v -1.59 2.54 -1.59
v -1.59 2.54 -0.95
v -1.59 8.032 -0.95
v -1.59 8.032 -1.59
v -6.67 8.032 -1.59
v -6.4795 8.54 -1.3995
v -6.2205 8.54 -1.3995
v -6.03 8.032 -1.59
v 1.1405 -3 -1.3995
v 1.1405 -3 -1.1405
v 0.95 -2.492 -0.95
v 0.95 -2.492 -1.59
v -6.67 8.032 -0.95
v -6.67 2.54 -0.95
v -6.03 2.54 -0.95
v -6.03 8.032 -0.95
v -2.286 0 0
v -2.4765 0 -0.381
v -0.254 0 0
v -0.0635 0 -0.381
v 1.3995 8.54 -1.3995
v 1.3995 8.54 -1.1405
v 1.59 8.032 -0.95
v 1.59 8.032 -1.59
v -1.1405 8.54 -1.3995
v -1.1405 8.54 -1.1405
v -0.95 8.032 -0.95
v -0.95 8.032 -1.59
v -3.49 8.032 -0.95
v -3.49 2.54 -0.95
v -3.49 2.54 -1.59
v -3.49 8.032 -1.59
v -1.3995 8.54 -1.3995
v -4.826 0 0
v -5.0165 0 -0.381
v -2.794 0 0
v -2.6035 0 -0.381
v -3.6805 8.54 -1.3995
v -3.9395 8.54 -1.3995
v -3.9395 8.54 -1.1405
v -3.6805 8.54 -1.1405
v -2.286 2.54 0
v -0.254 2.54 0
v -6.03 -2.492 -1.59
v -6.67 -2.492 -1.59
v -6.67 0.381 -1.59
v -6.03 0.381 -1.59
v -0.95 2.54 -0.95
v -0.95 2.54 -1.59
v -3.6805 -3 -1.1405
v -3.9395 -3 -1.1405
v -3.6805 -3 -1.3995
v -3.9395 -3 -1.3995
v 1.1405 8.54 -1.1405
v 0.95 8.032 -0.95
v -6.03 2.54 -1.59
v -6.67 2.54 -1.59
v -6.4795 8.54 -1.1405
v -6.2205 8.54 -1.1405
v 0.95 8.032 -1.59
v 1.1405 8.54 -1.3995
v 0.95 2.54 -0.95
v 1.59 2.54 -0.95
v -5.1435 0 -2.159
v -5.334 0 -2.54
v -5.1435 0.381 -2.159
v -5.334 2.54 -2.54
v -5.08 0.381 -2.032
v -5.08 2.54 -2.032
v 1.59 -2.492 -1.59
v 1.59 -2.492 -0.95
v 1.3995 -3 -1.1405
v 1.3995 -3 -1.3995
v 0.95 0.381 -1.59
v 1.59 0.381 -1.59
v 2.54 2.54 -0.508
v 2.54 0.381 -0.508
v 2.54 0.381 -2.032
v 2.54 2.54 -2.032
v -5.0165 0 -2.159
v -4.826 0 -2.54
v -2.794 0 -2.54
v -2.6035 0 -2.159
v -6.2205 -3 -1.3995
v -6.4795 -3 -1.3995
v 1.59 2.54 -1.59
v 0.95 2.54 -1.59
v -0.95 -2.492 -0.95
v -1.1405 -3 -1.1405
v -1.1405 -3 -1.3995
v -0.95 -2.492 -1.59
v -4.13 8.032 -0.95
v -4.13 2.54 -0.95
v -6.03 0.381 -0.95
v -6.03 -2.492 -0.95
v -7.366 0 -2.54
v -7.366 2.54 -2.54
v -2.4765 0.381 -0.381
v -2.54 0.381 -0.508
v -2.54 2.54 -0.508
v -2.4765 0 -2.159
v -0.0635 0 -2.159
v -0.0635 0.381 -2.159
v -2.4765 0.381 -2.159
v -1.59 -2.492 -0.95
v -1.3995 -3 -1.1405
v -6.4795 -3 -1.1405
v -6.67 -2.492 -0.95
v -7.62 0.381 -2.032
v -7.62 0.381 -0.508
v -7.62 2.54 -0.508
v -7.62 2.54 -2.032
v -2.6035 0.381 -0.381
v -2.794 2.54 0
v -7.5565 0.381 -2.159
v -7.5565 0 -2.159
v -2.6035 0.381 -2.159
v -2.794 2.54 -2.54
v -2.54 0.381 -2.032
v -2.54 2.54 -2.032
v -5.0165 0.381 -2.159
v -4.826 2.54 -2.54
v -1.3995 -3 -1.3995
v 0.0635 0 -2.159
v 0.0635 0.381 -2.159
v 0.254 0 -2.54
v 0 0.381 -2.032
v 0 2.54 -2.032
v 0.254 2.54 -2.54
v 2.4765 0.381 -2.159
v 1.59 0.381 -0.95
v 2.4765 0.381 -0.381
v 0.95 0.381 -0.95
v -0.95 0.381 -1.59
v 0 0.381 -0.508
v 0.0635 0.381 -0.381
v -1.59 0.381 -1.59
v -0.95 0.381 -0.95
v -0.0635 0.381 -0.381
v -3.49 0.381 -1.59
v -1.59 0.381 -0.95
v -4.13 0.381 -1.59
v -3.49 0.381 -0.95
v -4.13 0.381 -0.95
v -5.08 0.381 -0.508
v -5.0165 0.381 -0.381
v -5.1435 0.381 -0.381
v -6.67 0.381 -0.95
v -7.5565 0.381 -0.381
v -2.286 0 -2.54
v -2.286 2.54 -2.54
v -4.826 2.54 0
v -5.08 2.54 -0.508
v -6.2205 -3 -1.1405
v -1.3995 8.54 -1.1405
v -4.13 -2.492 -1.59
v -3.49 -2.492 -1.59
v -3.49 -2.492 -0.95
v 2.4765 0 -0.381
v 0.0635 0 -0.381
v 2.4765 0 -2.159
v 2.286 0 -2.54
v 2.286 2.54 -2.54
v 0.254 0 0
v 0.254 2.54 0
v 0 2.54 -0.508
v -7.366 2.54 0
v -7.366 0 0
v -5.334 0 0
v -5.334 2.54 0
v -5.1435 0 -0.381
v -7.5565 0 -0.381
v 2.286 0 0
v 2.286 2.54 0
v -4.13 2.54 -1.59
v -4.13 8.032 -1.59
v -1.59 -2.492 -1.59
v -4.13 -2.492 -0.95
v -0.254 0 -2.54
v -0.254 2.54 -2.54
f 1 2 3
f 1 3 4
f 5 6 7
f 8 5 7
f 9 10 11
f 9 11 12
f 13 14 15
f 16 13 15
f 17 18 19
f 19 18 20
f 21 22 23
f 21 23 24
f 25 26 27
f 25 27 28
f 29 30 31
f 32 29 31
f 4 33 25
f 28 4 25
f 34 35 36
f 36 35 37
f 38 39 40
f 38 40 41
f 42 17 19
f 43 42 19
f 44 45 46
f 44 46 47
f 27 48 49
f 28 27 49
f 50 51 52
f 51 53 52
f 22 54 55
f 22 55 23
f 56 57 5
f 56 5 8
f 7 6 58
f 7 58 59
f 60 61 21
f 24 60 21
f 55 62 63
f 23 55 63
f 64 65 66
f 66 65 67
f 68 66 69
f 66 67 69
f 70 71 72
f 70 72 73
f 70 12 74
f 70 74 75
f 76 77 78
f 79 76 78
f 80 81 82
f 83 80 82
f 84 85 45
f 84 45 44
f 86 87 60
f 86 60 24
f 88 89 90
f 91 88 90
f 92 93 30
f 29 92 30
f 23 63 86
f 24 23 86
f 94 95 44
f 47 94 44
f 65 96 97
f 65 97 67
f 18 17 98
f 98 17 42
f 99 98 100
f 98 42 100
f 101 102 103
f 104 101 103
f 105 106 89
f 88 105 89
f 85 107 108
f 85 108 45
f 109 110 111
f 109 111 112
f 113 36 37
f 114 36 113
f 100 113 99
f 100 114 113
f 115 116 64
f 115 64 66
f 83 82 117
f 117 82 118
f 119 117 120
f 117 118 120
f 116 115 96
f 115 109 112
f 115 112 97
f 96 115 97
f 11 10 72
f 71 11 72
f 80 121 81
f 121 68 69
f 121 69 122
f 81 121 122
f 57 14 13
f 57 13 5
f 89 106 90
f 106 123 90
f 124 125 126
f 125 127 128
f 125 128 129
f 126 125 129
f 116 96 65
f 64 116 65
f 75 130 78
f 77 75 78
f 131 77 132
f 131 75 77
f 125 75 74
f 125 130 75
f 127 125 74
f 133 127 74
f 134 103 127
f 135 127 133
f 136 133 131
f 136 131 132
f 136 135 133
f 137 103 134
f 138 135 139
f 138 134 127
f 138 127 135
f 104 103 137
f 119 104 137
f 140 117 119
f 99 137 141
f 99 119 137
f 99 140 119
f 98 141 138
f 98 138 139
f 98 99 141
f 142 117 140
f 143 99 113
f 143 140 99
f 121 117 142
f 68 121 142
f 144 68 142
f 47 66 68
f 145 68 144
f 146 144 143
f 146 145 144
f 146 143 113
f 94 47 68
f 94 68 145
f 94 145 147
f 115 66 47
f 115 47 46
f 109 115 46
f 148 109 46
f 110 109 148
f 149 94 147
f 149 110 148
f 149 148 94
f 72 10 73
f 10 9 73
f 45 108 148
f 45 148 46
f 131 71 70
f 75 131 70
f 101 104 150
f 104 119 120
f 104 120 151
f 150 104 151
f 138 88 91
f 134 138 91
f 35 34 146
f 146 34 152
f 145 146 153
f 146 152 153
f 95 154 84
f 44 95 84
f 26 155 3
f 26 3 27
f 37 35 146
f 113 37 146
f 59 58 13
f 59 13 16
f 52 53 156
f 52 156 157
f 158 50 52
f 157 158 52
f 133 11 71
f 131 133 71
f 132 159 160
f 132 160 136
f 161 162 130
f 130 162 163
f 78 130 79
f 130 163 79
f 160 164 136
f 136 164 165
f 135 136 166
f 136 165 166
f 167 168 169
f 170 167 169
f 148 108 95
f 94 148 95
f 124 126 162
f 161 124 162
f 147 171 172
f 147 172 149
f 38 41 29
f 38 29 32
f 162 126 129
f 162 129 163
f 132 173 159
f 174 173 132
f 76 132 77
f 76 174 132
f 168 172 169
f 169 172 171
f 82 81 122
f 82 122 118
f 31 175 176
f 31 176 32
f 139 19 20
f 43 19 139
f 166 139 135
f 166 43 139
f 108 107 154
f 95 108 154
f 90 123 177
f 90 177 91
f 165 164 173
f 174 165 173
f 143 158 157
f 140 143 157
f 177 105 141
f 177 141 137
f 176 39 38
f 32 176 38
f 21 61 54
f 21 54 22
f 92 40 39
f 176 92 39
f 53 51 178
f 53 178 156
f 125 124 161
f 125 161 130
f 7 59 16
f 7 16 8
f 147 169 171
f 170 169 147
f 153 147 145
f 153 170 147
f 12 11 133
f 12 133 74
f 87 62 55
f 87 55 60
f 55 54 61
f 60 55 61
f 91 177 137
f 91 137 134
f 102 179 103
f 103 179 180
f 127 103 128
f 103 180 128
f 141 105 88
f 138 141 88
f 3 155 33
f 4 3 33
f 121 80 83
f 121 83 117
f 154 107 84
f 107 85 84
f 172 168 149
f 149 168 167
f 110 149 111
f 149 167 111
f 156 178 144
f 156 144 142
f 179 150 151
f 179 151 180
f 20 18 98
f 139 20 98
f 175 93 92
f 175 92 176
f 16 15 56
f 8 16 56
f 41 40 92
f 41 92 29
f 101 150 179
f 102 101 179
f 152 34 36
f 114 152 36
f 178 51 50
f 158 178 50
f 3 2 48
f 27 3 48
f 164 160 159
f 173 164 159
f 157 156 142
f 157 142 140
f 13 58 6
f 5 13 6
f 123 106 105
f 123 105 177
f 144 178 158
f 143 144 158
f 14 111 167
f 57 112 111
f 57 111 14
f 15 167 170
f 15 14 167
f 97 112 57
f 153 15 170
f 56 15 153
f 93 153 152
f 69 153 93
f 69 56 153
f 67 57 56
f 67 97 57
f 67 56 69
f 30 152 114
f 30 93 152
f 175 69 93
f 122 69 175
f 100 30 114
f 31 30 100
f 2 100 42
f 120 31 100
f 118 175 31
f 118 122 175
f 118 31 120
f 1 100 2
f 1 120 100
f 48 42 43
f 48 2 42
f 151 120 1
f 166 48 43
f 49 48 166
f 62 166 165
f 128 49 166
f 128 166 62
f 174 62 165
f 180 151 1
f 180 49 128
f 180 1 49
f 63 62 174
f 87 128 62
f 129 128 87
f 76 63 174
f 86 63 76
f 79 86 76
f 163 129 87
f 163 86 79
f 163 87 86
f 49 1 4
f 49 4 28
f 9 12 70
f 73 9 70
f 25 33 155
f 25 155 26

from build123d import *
from OCP.BRepFilletAPI import BRepFilletAPI_MakeChamfer

# Parameters (mm, degrees)
SKETCH1_W                     = 2.54
SKETCH1_H                     = 2.54
MAIN_BODY_DEPTH               = 2.54
SKETCH3_W                     = 1.778
SKETCH3_H                     = 0.381
CUT_EXTRUDE1_DEPTH            = 5.399409051
CUT_EXTRUDE2_DEPTH            = 5.399409051
BODY_PATTERN_COUNT            = 4
BODY_PATTERN_PITCH            = 2.54
PIN_START                     = -5.54
SKETCH2_W                     = 0.64
SKETCH2_H                     = 0.64
PIN_DEPTH                     = 11.54
CHAMFER1_SIZE                 = 0.508
CHAMFER1_SIZE2                = 0.1905
CHAMFER2_SIZE                 = 0.1905
CHAMFER2_SIZE2                = 0.508
PIN_PATTERN_COUNT             = 4
PIN_PATTERN_PITCH             = 2.54
CHAMFER1_OF_PIN_PATTERN_SIZE  = 0.508
CHAMFER1_OF_PIN_PATTERN_SIZE2 = 0.1905
CHAMFER2_OF_PIN_PATTERN_SIZE2 = 0.1905
CHAMFER2_OF_PIN_PATTERN_SIZE  = 0.508


with BuildPart() as part:
    # Sketch1 → Main Body (new body)
    with BuildSketch(Plane(origin=(0, 0, 0), x_dir=(1, 0, 0), z_dir=(0, 1, 0))):
        with Locations((1.27, 1.27)):
            Rectangle(SKETCH1_W, SKETCH1_H)
    main_body = extrude(amount=MAIN_BODY_DEPTH)

    # Sketch3 → Cut-Extrude1 (cut, through all)
    with BuildSketch(Plane.ZY):
        with Locations((-1.27, 0.1905)):
            Rectangle(SKETCH3_W, SKETCH3_H)
    cut_extrude1 = extrude(amount=-CUT_EXTRUDE1_DEPTH, mode=Mode.SUBTRACT)

    # Sketch4 → Cut-Extrude2 (cut, through all)
    with BuildSketch(Plane(origin=(0, 2.54, 0), x_dir=(1, 0, 0), z_dir=(0, 1, 0))):
        Polygon((0.254, 2.54), (0, 2.54), (0, 2.032), align=None)
        Polygon((2.54, 2.54), (2.286, 2.54), (2.54, 2.032), align=None)
        Polygon((0.254, 0), (0, 0.508), (0, 0), align=None)
        Polygon((2.54, 0), (2.286, 0), (2.54, 0.508), align=None)
    cut_extrude2 = extrude(amount=-CUT_EXTRUDE2_DEPTH, mode=Mode.SUBTRACT)

    # Body Pattern: Main Body, Cut-Extrude1, Cut-Extrude2 ×4
    with Locations(*[(-i * BODY_PATTERN_PITCH, 0, 0) for i in range(1, BODY_PATTERN_COUNT)]):
        add(main_body)
        add(cut_extrude1, mode=Mode.SUBTRACT)
        add(cut_extrude2, mode=Mode.SUBTRACT)

    # Sketch2 → Pin (add)
    with BuildSketch(Plane(origin=(0, 2.54, 0), x_dir=(1, 0, 0), z_dir=(0, 1, 0)).offset(PIN_START)):
        with Locations((1.27, 1.27)):
            Rectangle(SKETCH2_W, SKETCH2_H)
    pin = extrude(amount=PIN_DEPTH)

    # Chamfer1: one chamfer whose edges measure the first distance from different faces: ONE call of the kernel's chamfer builder (chamfer() names one face for all edges)
    chamfer1_edges_1 = [part.edges().sort_by_distance(p)[0] for p in [
        (0.95, 8.54, -1.27),
    ]]
    chamfer1_side_1 = [part.faces().sort_by_distance(p)[0] for p in [
        (0.95, 5.54, -1.27),
    ]]
    chamfer1_edges_2 = [part.edges().sort_by_distance(p)[0] for p in [
        (1.27, 8.54, -0.95),
    ]]
    chamfer1_side_2 = [part.faces().sort_by_distance(p)[0] for p in [
        (1.27, 5.54, -0.95),
    ]]
    chamfer1_edges_3 = [part.edges().sort_by_distance(p)[0] for p in [
        (1.59, 8.54, -1.27),
    ]]
    chamfer1_side_3 = [part.faces().sort_by_distance(p)[0] for p in [
        (1.59, 5.54, -1.27),
    ]]
    chamfer1_edges_4 = [part.edges().sort_by_distance(p)[0] for p in [
        (1.27, 8.54, -1.59),
    ]]
    chamfer1_side_4 = [part.faces().sort_by_distance(p)[0] for p in [
        (1.27, 5.54, -1.59),
    ]]
    chamfer1 = BRepFilletAPI_MakeChamfer(part.part.solid().wrapped)
    for e in chamfer1_edges_1:
        chamfer1.Add(CHAMFER1_SIZE, CHAMFER1_SIZE2, e.wrapped, chamfer1_side_1[0].wrapped)  # the first distance lies on this face
    for e in chamfer1_edges_2:
        chamfer1.Add(CHAMFER1_SIZE, CHAMFER1_SIZE2, e.wrapped, chamfer1_side_2[0].wrapped)  # the first distance lies on this face
    for e in chamfer1_edges_3:
        chamfer1.Add(CHAMFER1_SIZE, CHAMFER1_SIZE2, e.wrapped, chamfer1_side_3[0].wrapped)  # the first distance lies on this face
    for e in chamfer1_edges_4:
        chamfer1.Add(CHAMFER1_SIZE, CHAMFER1_SIZE2, e.wrapped, chamfer1_side_4[0].wrapped)  # the first distance lies on this face
    add(Compound.cast(chamfer1.Shape()), mode=Mode.REPLACE)

    # Chamfer2
    chamfer2_edges = [part.edges().sort_by_distance(p)[0] for p in [
        (1.27, -3, -0.95),
        (1.59, -3, -1.27),
        (1.27, -3, -1.59),
        (0.95, -3, -1.27),
    ]]
    chamfer2_side = [part.faces().sort_by_distance(p)[0] for p in [
        (1.27, -3, -1.27),
    ]]
    chamfer(chamfer2_edges, length=CHAMFER2_SIZE, length2=CHAMFER2_SIZE2, reference=chamfer2_side[0])

    # Pin Pattern: Pin ×4
    with Locations(*[(-i * PIN_PATTERN_PITCH, 0, 0) for i in range(1, PIN_PATTERN_COUNT)]):
        add(pin)

    # Chamfer1 of Pin Pattern: one chamfer whose edges measure the first distance from different faces: ONE call of the kernel's chamfer builder (chamfer() names one face for all edges)
    chamfer1_of_pin_pattern_edges_1 = [part.edges().sort_by_distance(p)[0] for p in [
        (-1.59, 8.54, -1.27),
    ]]
    chamfer1_of_pin_pattern_side_1 = [part.faces().sort_by_distance(p)[0] for p in [
        (-1.59, 5.54, -1.27),
    ]]
    chamfer1_of_pin_pattern_edges_2 = [part.edges().sort_by_distance(p)[0] for p in [
        (-1.27, 8.54, -0.95),
    ]]
    chamfer1_of_pin_pattern_side_2 = [part.faces().sort_by_distance(p)[0] for p in [
        (-1.27, 5.54, -0.95),
    ]]
    chamfer1_of_pin_pattern_edges_3 = [part.edges().sort_by_distance(p)[0] for p in [
        (-0.95, 8.54, -1.27),
    ]]
    chamfer1_of_pin_pattern_side_3 = [part.faces().sort_by_distance(p)[0] for p in [
        (-0.95, 5.54, -1.27),
    ]]
    chamfer1_of_pin_pattern_edges_4 = [part.edges().sort_by_distance(p)[0] for p in [
        (-1.27, 8.54, -1.59),
    ]]
    chamfer1_of_pin_pattern_side_4 = [part.faces().sort_by_distance(p)[0] for p in [
        (-1.27, 5.54, -1.59),
    ]]
    chamfer1_of_pin_pattern_edges_5 = [part.edges().sort_by_distance(p)[0] for p in [
        (-4.13, 8.54, -1.27),
    ]]
    chamfer1_of_pin_pattern_side_5 = [part.faces().sort_by_distance(p)[0] for p in [
        (-4.13, 5.54, -1.27),
    ]]
    chamfer1_of_pin_pattern_edges_6 = [part.edges().sort_by_distance(p)[0] for p in [
        (-3.81, 8.54, -0.95),
    ]]
    chamfer1_of_pin_pattern_side_6 = [part.faces().sort_by_distance(p)[0] for p in [
        (-3.81, 5.54, -0.95),
    ]]
    chamfer1_of_pin_pattern_edges_7 = [part.edges().sort_by_distance(p)[0] for p in [
        (-3.49, 8.54, -1.27),
    ]]
    chamfer1_of_pin_pattern_side_7 = [part.faces().sort_by_distance(p)[0] for p in [
        (-3.49, 5.54, -1.27),
    ]]
    chamfer1_of_pin_pattern_edges_8 = [part.edges().sort_by_distance(p)[0] for p in [
        (-3.81, 8.54, -1.59),
    ]]
    chamfer1_of_pin_pattern_side_8 = [part.faces().sort_by_distance(p)[0] for p in [
        (-3.81, 5.54, -1.59),
    ]]
    chamfer1_of_pin_pattern_edges_9 = [part.edges().sort_by_distance(p)[0] for p in [
        (-6.67, 8.54, -1.27),
    ]]
    chamfer1_of_pin_pattern_side_9 = [part.faces().sort_by_distance(p)[0] for p in [
        (-6.67, 5.54, -1.27),
    ]]
    chamfer1_of_pin_pattern_edges_10 = [part.edges().sort_by_distance(p)[0] for p in [
        (-6.35, 8.54, -0.95),
    ]]
    chamfer1_of_pin_pattern_side_10 = [part.faces().sort_by_distance(p)[0] for p in [
        (-6.35, 5.54, -0.95),
    ]]
    chamfer1_of_pin_pattern_edges_11 = [part.edges().sort_by_distance(p)[0] for p in [
        (-6.03, 8.54, -1.27),
    ]]
    chamfer1_of_pin_pattern_side_11 = [part.faces().sort_by_distance(p)[0] for p in [
        (-6.03, 5.54, -1.27),
    ]]
    chamfer1_of_pin_pattern_edges_12 = [part.edges().sort_by_distance(p)[0] for p in [
        (-6.35, 8.54, -1.59),
    ]]
    chamfer1_of_pin_pattern_side_12 = [part.faces().sort_by_distance(p)[0] for p in [
        (-6.35, 5.54, -1.59),
    ]]
    chamfer1_of_pin_pattern = BRepFilletAPI_MakeChamfer(part.part.solid().wrapped)
    for e in chamfer1_of_pin_pattern_edges_1:
        chamfer1_of_pin_pattern.Add(CHAMFER1_OF_PIN_PATTERN_SIZE, CHAMFER1_OF_PIN_PATTERN_SIZE2, e.wrapped, chamfer1_of_pin_pattern_side_1[0].wrapped)  # the first distance lies on this face
    for e in chamfer1_of_pin_pattern_edges_2:
        chamfer1_of_pin_pattern.Add(CHAMFER1_OF_PIN_PATTERN_SIZE, CHAMFER1_OF_PIN_PATTERN_SIZE2, e.wrapped, chamfer1_of_pin_pattern_side_2[0].wrapped)  # the first distance lies on this face
    for e in chamfer1_of_pin_pattern_edges_3:
        chamfer1_of_pin_pattern.Add(CHAMFER1_OF_PIN_PATTERN_SIZE, CHAMFER1_OF_PIN_PATTERN_SIZE2, e.wrapped, chamfer1_of_pin_pattern_side_3[0].wrapped)  # the first distance lies on this face
    for e in chamfer1_of_pin_pattern_edges_4:
        chamfer1_of_pin_pattern.Add(CHAMFER1_OF_PIN_PATTERN_SIZE, CHAMFER1_OF_PIN_PATTERN_SIZE2, e.wrapped, chamfer1_of_pin_pattern_side_4[0].wrapped)  # the first distance lies on this face
    for e in chamfer1_of_pin_pattern_edges_5:
        chamfer1_of_pin_pattern.Add(CHAMFER1_OF_PIN_PATTERN_SIZE, CHAMFER1_OF_PIN_PATTERN_SIZE2, e.wrapped, chamfer1_of_pin_pattern_side_5[0].wrapped)  # the first distance lies on this face
    for e in chamfer1_of_pin_pattern_edges_6:
        chamfer1_of_pin_pattern.Add(CHAMFER1_OF_PIN_PATTERN_SIZE, CHAMFER1_OF_PIN_PATTERN_SIZE2, e.wrapped, chamfer1_of_pin_pattern_side_6[0].wrapped)  # the first distance lies on this face
    for e in chamfer1_of_pin_pattern_edges_7:
        chamfer1_of_pin_pattern.Add(CHAMFER1_OF_PIN_PATTERN_SIZE, CHAMFER1_OF_PIN_PATTERN_SIZE2, e.wrapped, chamfer1_of_pin_pattern_side_7[0].wrapped)  # the first distance lies on this face
    for e in chamfer1_of_pin_pattern_edges_8:
        chamfer1_of_pin_pattern.Add(CHAMFER1_OF_PIN_PATTERN_SIZE, CHAMFER1_OF_PIN_PATTERN_SIZE2, e.wrapped, chamfer1_of_pin_pattern_side_8[0].wrapped)  # the first distance lies on this face
    for e in chamfer1_of_pin_pattern_edges_9:
        chamfer1_of_pin_pattern.Add(CHAMFER1_OF_PIN_PATTERN_SIZE, CHAMFER1_OF_PIN_PATTERN_SIZE2, e.wrapped, chamfer1_of_pin_pattern_side_9[0].wrapped)  # the first distance lies on this face
    for e in chamfer1_of_pin_pattern_edges_10:
        chamfer1_of_pin_pattern.Add(CHAMFER1_OF_PIN_PATTERN_SIZE, CHAMFER1_OF_PIN_PATTERN_SIZE2, e.wrapped, chamfer1_of_pin_pattern_side_10[0].wrapped)  # the first distance lies on this face
    for e in chamfer1_of_pin_pattern_edges_11:
        chamfer1_of_pin_pattern.Add(CHAMFER1_OF_PIN_PATTERN_SIZE, CHAMFER1_OF_PIN_PATTERN_SIZE2, e.wrapped, chamfer1_of_pin_pattern_side_11[0].wrapped)  # the first distance lies on this face
    for e in chamfer1_of_pin_pattern_edges_12:
        chamfer1_of_pin_pattern.Add(CHAMFER1_OF_PIN_PATTERN_SIZE, CHAMFER1_OF_PIN_PATTERN_SIZE2, e.wrapped, chamfer1_of_pin_pattern_side_12[0].wrapped)  # the first distance lies on this face
    add(Compound.cast(chamfer1_of_pin_pattern.Shape()), mode=Mode.REPLACE)

    # Chamfer2 of Pin Pattern
    chamfer2_of_pin_pattern_edges = [part.edges().sort_by_distance(p)[0] for p in [
        (-1.27, -3, -0.95),
        (-0.95, -3, -1.27),
        (-1.27, -3, -1.59),
        (-1.59, -3, -1.27),
        (-3.81, -3, -0.95),
        (-3.49, -3, -1.27),
        (-3.81, -3, -1.59),
        (-4.13, -3, -1.27),
        (-6.35, -3, -0.95),
        (-6.03, -3, -1.27),
        (-6.35, -3, -1.59),
        (-6.67, -3, -1.27),
    ]]
    chamfer(chamfer2_of_pin_pattern_edges, length=CHAMFER2_OF_PIN_PATTERN_SIZE, length2=CHAMFER2_OF_PIN_PATTERN_SIZE2)


solid = part.part
